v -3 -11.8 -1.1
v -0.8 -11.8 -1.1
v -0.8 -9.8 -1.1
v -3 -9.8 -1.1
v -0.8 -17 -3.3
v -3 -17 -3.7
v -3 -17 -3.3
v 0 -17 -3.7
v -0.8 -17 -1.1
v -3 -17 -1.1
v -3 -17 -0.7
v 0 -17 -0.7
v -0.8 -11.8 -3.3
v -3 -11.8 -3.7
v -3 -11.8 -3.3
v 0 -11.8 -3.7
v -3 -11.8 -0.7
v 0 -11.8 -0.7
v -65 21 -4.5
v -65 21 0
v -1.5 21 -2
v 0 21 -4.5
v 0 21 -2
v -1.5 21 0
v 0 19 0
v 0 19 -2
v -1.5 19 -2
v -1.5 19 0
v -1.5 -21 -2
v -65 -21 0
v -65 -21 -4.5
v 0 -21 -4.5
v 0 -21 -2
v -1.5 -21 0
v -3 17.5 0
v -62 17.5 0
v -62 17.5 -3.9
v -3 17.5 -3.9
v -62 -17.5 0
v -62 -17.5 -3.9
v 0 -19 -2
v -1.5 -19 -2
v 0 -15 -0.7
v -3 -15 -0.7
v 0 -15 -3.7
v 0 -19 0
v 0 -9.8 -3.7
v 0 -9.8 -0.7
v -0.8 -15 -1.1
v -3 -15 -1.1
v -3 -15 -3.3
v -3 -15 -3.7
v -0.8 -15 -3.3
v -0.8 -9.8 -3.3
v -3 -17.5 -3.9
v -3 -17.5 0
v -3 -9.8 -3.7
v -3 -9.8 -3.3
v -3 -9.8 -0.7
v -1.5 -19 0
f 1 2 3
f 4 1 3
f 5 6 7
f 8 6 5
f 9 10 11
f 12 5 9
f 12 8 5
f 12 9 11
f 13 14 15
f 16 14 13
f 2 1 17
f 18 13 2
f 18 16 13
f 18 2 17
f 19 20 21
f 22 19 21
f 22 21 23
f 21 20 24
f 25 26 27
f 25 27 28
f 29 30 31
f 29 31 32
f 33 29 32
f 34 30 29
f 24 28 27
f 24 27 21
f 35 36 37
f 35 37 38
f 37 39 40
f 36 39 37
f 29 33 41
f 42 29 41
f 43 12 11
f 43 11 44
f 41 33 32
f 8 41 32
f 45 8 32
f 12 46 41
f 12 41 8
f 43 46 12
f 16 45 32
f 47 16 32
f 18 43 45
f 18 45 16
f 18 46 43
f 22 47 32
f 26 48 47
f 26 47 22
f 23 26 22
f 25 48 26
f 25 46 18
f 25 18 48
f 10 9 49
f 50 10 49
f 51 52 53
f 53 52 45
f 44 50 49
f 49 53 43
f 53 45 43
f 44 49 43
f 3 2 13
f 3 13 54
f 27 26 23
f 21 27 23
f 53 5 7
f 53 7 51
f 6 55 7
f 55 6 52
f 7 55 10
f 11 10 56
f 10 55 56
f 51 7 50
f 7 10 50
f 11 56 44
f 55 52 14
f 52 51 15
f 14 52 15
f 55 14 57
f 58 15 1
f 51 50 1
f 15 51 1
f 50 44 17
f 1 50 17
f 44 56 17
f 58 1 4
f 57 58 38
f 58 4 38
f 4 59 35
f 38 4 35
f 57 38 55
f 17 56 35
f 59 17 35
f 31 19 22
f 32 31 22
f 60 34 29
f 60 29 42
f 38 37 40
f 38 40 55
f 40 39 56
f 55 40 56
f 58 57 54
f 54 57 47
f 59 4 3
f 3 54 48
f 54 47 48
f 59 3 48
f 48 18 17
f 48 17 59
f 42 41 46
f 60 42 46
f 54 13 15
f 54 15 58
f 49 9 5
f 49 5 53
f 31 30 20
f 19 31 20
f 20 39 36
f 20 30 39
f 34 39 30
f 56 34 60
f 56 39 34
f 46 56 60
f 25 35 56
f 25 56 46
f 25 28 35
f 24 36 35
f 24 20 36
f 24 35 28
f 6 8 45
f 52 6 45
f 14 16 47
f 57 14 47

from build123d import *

# Parameters (mm, degrees)
SKETCH_W        = 65
SKETCH_H        = 42
PAD_DEPTH       = 4.5
SKETCH001_W     = 2
SKETCH001_H     = 2
POCKET_DEPTH    = 1.5
SKETCH002_W     = 2
SKETCH002_H     = 3
POCKET001_DEPTH = 0.8
SKETCH003_W     = 59
SKETCH003_H     = 35
POCKET002_DEPTH = 3.9
SKETCH004_W     = 2
SKETCH004_H     = 0.4
POCKET003_DEPTH = 5


with BuildPart() as part:
    # Sketch → Pad (new body)
    with BuildSketch(Plane.XY):
        with Locations((-32.5, 0)):
            Rectangle(SKETCH_W, SKETCH_H)
    extrude(amount=-PAD_DEPTH)

    # Sketch001 → Pocket (cut)
    with BuildSketch(Plane.YZ):
        with Locations((-20, -1)):
            Rectangle(SKETCH001_W, SKETCH001_H)
        with Locations((20, -1)):
            Rectangle(SKETCH001_W, SKETCH001_H)
    extrude(amount=-POCKET_DEPTH, mode=Mode.SUBTRACT)

    # Sketch002 → Pocket001 (cut)
    with BuildSketch(Plane.YZ):
        with Locations((-16, -2.2)):
            Rectangle(SKETCH002_W, SKETCH002_H)
        with Locations((-10.8, -2.2)):
            Rectangle(SKETCH002_W, SKETCH002_H)
    extrude(amount=-POCKET001_DEPTH, mode=Mode.SUBTRACT)

    # Sketch003 → Pocket002 (cut)
    with BuildSketch(Plane.XY):
        with Locations((-32.5, 0)):
            Rectangle(SKETCH003_W, SKETCH003_H)
    extrude(amount=-POCKET002_DEPTH, mode=Mode.SUBTRACT)

    # Sketch004 → Pocket003 (cut)
    with BuildSketch(Plane.YZ):
        with Locations((-16, -0.9)):
            Rectangle(SKETCH004_W, SKETCH004_H)
        with Locations((-16, -3.5)):
            Rectangle(SKETCH004_W, SKETCH004_H)
        with Locations((-10.8, -0.9)):
            Rectangle(SKETCH004_W, SKETCH004_H)
        with Locations((-10.8, -3.5)):
            Rectangle(SKETCH004_W, SKETCH004_H)
    extrude(amount=-POCKET003_DEPTH, mode=Mode.SUBTRACT)


solid = part.part
